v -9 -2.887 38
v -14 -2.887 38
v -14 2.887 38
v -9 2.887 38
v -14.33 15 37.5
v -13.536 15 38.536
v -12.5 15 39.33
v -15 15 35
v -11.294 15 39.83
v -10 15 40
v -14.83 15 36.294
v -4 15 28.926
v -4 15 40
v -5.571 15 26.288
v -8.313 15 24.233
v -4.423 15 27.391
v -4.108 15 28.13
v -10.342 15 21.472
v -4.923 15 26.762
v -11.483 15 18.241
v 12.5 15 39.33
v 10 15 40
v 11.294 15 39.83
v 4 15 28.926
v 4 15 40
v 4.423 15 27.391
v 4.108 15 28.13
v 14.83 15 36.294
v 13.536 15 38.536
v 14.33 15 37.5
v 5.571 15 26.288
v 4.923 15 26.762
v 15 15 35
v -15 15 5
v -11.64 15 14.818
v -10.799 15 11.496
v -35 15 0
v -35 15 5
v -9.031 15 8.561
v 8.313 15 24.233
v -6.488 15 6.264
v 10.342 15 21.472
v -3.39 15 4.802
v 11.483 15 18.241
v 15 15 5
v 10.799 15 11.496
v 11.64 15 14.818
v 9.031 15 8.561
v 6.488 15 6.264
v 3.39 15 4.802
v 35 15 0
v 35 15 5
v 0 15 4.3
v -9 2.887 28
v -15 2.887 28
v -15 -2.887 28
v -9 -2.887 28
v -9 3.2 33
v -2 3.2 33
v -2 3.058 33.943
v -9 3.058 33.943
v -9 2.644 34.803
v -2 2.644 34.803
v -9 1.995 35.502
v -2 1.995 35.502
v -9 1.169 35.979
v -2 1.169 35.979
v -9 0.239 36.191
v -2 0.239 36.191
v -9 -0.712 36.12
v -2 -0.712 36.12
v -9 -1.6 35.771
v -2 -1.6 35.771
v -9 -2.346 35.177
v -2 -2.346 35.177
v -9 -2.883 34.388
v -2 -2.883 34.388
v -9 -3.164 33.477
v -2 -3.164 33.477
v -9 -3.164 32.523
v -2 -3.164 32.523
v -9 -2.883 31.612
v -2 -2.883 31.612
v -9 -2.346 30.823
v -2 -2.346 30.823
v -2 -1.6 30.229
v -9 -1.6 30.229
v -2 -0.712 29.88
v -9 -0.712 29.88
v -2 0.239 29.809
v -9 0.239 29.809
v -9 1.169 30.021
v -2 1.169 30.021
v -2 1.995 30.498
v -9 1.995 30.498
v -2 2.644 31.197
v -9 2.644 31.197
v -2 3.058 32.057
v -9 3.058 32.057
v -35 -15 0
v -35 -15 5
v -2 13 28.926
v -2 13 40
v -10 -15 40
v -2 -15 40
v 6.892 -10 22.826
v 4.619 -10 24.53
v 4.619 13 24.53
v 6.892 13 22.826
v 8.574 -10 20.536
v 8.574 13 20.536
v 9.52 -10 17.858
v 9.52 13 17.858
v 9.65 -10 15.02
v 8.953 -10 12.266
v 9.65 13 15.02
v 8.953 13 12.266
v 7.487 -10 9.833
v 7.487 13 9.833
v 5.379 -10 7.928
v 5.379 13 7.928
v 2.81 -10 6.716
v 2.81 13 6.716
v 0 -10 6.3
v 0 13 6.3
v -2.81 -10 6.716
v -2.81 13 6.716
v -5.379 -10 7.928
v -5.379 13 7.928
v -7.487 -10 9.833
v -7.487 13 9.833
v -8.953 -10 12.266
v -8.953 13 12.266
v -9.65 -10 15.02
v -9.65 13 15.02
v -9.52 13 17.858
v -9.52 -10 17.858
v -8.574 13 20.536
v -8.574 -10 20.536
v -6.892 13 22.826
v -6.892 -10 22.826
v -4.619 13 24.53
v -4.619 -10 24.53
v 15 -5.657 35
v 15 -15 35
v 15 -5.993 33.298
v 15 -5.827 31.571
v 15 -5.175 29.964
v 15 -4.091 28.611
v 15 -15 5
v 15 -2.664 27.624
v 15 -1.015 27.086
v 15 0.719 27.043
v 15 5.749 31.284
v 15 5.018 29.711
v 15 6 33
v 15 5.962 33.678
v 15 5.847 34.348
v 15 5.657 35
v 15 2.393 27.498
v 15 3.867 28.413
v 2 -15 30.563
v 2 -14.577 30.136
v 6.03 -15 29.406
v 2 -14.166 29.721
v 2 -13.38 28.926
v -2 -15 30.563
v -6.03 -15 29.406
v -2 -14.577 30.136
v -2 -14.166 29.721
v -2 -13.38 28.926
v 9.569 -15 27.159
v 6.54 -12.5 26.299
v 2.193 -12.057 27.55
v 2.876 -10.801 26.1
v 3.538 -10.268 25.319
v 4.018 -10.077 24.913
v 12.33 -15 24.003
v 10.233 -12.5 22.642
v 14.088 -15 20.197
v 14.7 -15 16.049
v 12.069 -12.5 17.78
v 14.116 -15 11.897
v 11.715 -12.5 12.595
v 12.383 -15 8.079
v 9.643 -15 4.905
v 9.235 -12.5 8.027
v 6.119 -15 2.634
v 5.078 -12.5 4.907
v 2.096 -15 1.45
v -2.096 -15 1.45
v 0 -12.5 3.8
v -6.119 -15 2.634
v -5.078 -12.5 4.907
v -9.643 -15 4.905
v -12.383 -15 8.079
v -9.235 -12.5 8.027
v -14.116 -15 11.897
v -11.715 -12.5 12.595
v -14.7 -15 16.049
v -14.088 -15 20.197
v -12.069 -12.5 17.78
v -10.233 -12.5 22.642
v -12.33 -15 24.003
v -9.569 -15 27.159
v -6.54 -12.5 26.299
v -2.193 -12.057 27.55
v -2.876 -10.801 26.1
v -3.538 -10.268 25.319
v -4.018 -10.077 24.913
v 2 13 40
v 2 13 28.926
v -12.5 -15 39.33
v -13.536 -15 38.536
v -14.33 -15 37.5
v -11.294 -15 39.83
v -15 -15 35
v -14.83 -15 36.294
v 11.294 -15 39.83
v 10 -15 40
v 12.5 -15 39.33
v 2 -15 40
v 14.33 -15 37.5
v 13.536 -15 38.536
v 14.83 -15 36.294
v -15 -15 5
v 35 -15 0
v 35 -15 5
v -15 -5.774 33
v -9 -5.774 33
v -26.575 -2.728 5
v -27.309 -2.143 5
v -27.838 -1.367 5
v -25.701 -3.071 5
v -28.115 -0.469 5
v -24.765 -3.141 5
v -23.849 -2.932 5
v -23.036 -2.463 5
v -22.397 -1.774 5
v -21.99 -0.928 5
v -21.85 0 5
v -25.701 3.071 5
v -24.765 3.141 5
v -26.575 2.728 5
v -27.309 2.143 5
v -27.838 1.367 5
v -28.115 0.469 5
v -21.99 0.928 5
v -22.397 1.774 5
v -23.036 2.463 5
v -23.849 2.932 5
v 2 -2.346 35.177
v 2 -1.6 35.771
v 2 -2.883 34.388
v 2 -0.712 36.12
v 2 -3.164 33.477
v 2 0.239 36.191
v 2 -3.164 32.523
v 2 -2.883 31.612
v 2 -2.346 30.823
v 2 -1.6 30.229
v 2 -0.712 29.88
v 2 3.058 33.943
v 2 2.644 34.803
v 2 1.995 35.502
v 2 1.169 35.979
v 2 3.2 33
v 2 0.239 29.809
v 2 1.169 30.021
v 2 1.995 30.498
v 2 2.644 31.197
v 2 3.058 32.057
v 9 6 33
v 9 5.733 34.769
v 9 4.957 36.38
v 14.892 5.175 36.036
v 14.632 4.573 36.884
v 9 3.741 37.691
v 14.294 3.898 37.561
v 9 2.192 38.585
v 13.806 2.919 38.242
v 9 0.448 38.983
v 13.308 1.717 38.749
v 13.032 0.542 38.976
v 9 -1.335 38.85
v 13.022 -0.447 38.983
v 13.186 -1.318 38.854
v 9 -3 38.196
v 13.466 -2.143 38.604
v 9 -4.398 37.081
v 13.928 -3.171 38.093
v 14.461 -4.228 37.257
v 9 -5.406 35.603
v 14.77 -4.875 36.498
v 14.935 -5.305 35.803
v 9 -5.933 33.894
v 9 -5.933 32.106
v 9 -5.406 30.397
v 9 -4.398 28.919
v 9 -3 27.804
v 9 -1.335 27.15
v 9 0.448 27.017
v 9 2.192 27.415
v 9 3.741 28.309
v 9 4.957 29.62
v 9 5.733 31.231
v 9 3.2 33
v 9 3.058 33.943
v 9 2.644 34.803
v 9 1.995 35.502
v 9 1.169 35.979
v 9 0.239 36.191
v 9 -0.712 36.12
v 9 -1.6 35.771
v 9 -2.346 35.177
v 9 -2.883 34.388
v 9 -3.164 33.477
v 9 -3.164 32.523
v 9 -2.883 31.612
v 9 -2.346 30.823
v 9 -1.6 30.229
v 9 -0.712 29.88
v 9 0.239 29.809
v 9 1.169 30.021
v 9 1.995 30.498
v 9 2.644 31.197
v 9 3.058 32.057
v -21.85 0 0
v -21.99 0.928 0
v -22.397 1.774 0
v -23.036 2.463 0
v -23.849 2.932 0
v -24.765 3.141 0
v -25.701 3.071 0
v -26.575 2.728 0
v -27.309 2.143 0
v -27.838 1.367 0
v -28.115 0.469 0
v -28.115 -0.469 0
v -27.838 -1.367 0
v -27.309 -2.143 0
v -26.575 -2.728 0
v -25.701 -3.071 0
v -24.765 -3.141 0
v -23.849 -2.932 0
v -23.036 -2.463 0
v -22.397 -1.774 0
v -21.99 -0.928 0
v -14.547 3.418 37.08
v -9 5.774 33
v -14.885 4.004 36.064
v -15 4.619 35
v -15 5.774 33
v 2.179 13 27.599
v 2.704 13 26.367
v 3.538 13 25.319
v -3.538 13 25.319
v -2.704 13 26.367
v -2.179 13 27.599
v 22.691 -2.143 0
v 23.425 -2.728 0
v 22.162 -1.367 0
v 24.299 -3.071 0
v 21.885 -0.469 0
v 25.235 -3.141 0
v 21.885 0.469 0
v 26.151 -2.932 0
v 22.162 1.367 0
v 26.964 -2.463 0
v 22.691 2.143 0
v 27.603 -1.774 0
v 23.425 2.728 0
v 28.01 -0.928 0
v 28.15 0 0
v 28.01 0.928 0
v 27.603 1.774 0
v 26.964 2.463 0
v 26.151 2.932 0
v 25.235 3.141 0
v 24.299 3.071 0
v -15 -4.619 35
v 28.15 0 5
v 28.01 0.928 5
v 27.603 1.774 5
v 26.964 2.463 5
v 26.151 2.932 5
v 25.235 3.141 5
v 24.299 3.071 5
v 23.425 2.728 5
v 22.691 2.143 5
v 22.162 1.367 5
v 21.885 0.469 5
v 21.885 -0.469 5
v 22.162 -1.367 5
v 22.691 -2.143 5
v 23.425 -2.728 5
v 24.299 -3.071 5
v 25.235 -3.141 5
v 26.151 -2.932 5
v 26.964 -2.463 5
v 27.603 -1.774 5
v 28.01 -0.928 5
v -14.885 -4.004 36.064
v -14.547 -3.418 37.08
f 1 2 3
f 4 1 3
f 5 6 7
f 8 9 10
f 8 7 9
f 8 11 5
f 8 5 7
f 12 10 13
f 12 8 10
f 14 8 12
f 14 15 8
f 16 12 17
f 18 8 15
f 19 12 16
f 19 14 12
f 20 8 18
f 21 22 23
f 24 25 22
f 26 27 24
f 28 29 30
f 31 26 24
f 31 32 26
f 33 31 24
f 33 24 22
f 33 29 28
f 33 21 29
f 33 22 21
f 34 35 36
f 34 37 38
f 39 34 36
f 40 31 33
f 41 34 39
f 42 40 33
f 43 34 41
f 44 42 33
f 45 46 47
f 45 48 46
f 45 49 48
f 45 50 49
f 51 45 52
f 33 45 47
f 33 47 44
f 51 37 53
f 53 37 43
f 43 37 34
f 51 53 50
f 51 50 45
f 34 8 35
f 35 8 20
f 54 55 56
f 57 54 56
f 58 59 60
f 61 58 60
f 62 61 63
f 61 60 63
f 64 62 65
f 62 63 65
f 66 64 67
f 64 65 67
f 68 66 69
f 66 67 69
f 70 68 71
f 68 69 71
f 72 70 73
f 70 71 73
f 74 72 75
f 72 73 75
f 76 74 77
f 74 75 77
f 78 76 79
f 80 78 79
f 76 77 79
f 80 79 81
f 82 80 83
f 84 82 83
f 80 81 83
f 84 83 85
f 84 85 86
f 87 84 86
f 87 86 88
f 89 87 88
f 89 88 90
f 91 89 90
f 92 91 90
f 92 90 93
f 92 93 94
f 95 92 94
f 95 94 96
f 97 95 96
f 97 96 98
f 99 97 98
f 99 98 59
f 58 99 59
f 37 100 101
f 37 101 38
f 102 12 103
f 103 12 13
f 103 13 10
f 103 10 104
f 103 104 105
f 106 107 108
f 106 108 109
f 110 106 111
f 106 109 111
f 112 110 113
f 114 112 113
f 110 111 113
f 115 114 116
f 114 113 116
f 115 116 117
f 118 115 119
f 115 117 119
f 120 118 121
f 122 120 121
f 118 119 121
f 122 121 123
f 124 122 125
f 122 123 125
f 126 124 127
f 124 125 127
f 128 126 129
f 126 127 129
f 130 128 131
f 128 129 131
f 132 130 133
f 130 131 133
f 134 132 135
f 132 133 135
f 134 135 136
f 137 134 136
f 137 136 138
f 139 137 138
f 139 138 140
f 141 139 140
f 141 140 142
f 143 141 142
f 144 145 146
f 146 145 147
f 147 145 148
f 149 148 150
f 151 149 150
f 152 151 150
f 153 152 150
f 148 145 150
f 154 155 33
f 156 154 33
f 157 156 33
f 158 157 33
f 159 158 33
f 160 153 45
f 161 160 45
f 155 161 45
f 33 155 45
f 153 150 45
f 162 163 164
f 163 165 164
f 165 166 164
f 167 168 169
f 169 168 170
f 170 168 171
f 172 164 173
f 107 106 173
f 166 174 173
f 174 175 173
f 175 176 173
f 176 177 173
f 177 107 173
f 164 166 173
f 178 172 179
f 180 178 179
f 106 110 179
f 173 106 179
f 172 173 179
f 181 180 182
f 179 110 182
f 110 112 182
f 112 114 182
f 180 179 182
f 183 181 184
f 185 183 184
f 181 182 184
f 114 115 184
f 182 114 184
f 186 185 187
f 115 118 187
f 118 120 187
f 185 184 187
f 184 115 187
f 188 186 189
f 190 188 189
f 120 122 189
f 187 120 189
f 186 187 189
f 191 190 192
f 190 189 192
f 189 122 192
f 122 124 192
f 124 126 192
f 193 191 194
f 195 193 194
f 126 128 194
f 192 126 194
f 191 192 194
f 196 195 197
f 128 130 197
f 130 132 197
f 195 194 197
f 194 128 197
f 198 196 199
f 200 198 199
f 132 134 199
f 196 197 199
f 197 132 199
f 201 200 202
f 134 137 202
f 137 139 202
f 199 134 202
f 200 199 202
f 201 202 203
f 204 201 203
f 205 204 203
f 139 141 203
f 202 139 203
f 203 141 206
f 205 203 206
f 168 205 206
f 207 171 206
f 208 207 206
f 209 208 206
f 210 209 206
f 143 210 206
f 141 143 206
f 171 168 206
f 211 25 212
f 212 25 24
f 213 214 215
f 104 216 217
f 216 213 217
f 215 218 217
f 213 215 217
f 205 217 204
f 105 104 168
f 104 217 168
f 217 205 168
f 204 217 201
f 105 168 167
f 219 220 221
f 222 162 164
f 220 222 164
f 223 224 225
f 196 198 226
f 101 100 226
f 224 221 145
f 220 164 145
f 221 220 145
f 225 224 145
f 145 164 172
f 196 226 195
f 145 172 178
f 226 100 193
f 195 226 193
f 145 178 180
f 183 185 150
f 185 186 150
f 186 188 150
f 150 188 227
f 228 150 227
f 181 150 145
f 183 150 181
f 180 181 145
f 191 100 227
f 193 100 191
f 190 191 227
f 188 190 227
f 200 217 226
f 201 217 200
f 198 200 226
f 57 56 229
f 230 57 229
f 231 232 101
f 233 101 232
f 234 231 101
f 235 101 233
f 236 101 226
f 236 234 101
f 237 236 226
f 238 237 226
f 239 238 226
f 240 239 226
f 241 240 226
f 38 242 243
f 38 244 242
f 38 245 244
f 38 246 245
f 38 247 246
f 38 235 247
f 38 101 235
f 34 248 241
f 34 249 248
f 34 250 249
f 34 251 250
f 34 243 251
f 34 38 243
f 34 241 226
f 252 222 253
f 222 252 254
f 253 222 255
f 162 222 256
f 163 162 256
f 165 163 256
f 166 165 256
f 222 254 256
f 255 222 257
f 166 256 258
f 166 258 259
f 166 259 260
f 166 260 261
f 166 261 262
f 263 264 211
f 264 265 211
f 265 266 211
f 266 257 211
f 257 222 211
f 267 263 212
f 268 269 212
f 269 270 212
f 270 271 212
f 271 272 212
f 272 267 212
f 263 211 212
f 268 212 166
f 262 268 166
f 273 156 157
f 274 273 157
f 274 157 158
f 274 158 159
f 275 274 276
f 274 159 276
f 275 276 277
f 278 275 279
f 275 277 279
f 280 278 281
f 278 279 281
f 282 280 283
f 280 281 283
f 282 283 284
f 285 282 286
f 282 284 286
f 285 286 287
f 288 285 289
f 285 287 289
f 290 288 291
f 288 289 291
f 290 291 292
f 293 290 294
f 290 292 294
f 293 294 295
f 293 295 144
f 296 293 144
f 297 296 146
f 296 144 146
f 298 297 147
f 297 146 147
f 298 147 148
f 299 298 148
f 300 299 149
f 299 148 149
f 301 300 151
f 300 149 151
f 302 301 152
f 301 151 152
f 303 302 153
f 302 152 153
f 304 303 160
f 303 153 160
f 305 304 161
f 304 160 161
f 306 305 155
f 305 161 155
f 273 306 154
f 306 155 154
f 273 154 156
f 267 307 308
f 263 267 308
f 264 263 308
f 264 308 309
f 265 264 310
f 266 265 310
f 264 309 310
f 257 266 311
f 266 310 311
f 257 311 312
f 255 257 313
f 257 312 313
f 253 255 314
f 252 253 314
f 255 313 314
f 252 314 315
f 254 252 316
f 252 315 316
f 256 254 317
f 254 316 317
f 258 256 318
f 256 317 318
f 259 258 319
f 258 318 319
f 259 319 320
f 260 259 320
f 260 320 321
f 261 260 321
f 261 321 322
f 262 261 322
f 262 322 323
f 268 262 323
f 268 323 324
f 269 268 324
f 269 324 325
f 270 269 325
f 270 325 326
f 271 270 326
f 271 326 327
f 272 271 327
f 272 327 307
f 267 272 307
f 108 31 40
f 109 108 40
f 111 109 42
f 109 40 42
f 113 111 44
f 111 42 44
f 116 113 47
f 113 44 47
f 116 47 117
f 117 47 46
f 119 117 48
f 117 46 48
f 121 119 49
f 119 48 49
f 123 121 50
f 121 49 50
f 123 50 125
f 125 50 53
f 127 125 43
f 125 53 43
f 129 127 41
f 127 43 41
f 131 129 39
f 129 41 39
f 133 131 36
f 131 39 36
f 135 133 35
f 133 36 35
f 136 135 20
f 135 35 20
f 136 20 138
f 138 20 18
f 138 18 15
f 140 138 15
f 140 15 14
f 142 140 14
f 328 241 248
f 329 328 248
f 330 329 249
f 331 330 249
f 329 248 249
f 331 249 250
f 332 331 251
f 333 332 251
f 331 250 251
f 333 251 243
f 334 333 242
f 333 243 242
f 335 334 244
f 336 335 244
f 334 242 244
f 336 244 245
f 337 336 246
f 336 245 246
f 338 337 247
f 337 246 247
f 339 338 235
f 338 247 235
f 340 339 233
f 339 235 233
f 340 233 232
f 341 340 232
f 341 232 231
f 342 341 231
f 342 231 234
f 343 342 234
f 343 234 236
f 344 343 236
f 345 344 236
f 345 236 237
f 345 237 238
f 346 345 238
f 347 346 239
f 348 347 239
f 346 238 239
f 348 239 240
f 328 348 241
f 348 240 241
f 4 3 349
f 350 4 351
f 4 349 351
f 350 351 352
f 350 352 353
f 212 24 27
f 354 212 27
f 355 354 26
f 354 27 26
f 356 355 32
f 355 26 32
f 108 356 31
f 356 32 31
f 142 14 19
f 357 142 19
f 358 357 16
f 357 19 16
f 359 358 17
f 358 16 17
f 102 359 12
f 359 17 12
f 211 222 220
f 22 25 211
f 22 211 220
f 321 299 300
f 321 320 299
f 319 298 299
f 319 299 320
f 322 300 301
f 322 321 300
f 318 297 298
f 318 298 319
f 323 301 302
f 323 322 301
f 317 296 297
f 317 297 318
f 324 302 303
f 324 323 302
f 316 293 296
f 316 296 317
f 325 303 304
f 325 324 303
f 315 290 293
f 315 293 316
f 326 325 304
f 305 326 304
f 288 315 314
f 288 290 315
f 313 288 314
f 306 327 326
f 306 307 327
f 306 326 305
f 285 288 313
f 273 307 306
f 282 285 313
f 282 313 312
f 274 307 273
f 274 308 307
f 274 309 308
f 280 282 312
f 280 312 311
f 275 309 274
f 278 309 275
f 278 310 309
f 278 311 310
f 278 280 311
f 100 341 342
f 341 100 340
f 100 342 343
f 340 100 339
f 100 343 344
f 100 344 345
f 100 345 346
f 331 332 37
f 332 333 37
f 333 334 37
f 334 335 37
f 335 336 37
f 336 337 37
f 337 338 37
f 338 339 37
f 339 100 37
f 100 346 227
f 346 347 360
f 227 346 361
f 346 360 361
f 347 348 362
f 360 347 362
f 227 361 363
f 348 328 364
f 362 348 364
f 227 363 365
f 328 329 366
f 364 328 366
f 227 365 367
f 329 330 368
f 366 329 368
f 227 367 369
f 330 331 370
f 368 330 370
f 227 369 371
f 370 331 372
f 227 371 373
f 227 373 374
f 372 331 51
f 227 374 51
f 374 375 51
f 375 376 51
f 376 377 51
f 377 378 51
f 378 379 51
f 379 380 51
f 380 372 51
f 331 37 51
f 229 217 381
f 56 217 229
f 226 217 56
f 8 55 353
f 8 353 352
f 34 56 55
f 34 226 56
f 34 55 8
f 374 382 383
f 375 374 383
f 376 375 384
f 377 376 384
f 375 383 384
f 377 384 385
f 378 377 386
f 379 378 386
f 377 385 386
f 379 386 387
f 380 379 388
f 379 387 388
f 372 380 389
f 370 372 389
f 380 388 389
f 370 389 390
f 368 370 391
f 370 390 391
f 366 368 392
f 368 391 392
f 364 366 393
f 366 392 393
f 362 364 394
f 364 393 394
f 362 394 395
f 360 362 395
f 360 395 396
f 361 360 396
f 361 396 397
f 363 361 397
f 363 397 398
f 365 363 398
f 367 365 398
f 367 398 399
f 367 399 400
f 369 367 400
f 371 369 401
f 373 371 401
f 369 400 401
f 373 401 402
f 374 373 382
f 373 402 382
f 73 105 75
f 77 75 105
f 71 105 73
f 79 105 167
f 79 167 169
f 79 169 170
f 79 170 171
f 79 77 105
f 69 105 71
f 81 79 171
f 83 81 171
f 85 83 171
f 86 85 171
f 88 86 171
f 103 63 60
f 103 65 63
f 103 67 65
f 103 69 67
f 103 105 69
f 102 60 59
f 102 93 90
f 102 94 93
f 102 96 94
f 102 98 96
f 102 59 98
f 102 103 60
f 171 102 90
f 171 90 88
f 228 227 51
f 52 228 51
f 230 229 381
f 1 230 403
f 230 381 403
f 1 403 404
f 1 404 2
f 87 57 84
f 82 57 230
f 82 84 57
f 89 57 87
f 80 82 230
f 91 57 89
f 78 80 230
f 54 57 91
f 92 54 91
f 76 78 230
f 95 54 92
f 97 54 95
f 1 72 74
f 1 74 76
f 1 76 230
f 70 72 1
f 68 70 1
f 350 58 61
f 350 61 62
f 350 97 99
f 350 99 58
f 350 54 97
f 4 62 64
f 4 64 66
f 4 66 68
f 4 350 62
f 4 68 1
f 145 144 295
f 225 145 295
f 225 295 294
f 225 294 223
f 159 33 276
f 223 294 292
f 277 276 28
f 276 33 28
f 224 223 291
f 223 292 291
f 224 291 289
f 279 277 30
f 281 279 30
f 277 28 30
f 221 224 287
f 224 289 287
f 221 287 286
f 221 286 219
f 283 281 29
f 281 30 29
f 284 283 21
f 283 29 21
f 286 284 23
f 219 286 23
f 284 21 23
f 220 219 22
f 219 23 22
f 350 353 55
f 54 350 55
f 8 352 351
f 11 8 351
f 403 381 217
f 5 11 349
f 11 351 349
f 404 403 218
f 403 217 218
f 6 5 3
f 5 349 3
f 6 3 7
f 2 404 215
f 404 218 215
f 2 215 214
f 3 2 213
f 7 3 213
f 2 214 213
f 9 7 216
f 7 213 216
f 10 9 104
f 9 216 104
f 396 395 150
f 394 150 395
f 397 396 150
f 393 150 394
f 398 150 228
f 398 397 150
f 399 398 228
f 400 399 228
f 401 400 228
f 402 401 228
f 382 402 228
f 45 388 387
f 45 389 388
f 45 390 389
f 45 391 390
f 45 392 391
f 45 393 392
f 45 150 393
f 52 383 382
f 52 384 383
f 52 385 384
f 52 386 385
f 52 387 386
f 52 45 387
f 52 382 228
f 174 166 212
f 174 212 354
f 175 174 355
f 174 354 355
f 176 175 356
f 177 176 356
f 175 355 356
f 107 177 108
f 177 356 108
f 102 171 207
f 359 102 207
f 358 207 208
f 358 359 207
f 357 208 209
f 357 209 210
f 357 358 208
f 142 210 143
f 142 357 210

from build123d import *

# Parameters (mm, degrees)
SKETCH_1_W          = 70
SKETCH_1_H          = 30
EXTRUDE_1_DEPTH     = 5
SKETCH_2_R          = 3.15
CUT_EXTRUDE_1_DEPTH = 5
SKETCH_3_W          = 30
SKETCH_3_H          = 30
EXTRUDE_2_DEPTH     = 35
SKETCH_4_R          = 9.7
CUT_EXTRUDE_2_DEPTH = 30
CHAMFER_1_SIZE      = 5
SKETCH_5_W          = 4
SKETCH_5_H          = 18
CUT_EXTRUDE_3_DEPTH = 30
FILLET_1_R          = 5
SKETCH_6_R          = 3.2
CUT_EXTRUDE_4_DEPTH = 30
SKETCH_7_R          = 6
CUT_EXTRUDE_5_DEPTH = 6
CUT_EXTRUDE_6_DEPTH = 6
FILLET_2_R          = 5
CHAMFER_2_SIZE      = 2


with BuildPart() as part:
    # 草图1 → 凸台-拉伸1 (new body)
    with BuildSketch(Plane.XY):
        Rectangle(SKETCH_1_W, SKETCH_1_H)
    extrude(amount=EXTRUDE_1_DEPTH)

    # 草图2 → 切除-拉伸1 (cut)
    with BuildSketch(Plane.XY.offset(5)):
        with Locations((-25, 0)):
            Circle(SKETCH_2_R)
        with Locations((25, 0)):
            Circle(SKETCH_2_R)
    extrude(amount=-CUT_EXTRUDE_1_DEPTH, mode=Mode.SUBTRACT)

    # 草图3 → 凸台-拉伸2 (add)
    with BuildSketch(Plane.XY.offset(5)):
        Rectangle(SKETCH_3_W, SKETCH_3_H)
    extrude(amount=EXTRUDE_2_DEPTH)

    # 草图4 → 切除-拉伸2 (cut)
    with BuildSketch(Plane(origin=(0, 15, 0), x_dir=(1, 0, 0), z_dir=(0, 1, 0))):
        with Locations(Location((0, -16, 0), (0, 0, 270))):
            Circle(SKETCH_4_R)
    extrude(amount=-CUT_EXTRUDE_2_DEPTH, mode=Mode.SUBTRACT)

    # 倒角1
    chamfer_1_edges = [part.edges().sort_by_distance(p)[0] for p in [
        (0, -15, 6.3),
    ]]
    chamfer(chamfer_1_edges, length=CHAMFER_1_SIZE)

    # 草图5 → 切除-拉伸3 (cut)
    with BuildSketch(Plane(origin=(0, 15, 0), x_dir=(1, 0, 0), z_dir=(0, 1, 0))):
        with Locations((0, -31)):
            Rectangle(SKETCH_5_W, SKETCH_5_H)
    extrude(amount=-CUT_EXTRUDE_3_DEPTH, mode=Mode.SUBTRACT)

    # 圆角1
    fillet_1_edges = [part.edges().sort_by_distance(p)[0] for p in [
        (2, 2.5, 25.491575212),
        (-2, 2.5, 25.491575212),
    ]]
    fillet(fillet_1_edges, radius=FILLET_1_R)

    # 草图6 → 切除-拉伸4 (cut)
    with BuildSketch(Plane(origin=(15, 0, 0), x_dir=(0, 0, -1), z_dir=(1, 0, 0))):
        with Locations(Location((-33, 0, 0), (0, 0, 90))):
            Circle(SKETCH_6_R)
    extrude(amount=-CUT_EXTRUDE_4_DEPTH, mode=Mode.SUBTRACT)

    # 草图7 → 切除-拉伸5 (cut)
    with BuildSketch(Plane(origin=(15, 0, 0), x_dir=(0, 0, -1), z_dir=(1, 0, 0))):
        with Locations(Location((-33, 0, 0), (0, 0, 90))):
            Circle(SKETCH_7_R)
    extrude(amount=-CUT_EXTRUDE_5_DEPTH, mode=Mode.SUBTRACT)

    # 草图8 → 切除-拉伸6 (cut)
    with BuildSketch(Plane.ZY.offset(15)):
        Polygon((28, -2.886751346), (33, -5.773502692), (38, -2.886751346), (38, 2.886751346), (33, 5.773502692), (28, 2.886751346), align=None)
    extrude(amount=-CUT_EXTRUDE_6_DEPTH, mode=Mode.SUBTRACT)

    # 圆角2
    # the kernel refuses this fillet: 5 mm, written as the material it takes off along each edge
    with BuildSketch(Plane(origin=(-15, -27.5, 40), x_dir=(1, 0, 0), z_dir=(0, 1, 0)), Plane(origin=(15, 27.5, 40), x_dir=(-1, 0, 0), z_dir=(0, -1, 0))) as fillet_2_piece_1:
        with BuildLine():
            CenterArc((FILLET_2_R, FILLET_2_R), FILLET_2_R, 180, 90)
            Line((0, FILLET_2_R), (0, 0))
            Line((0, 0), (FILLET_2_R, 0))
        make_face()
    extrude(amount=55, mode=Mode.SUBTRACT)

    # 倒角2
    chamfer_2_edges = [part.edges().sort_by_distance(p)[0] for p in [
        (2, 15, 34.463164859),
        (0, 15, 6.3),
        (-2, 15, 34.463164859),
        (-2.704376535, 15, 26.36749814),
        (2.704376535, 15, 26.36749814),
    ]]
    chamfer(chamfer_2_edges, length=CHAMFER_2_SIZE)


solid = part.part
